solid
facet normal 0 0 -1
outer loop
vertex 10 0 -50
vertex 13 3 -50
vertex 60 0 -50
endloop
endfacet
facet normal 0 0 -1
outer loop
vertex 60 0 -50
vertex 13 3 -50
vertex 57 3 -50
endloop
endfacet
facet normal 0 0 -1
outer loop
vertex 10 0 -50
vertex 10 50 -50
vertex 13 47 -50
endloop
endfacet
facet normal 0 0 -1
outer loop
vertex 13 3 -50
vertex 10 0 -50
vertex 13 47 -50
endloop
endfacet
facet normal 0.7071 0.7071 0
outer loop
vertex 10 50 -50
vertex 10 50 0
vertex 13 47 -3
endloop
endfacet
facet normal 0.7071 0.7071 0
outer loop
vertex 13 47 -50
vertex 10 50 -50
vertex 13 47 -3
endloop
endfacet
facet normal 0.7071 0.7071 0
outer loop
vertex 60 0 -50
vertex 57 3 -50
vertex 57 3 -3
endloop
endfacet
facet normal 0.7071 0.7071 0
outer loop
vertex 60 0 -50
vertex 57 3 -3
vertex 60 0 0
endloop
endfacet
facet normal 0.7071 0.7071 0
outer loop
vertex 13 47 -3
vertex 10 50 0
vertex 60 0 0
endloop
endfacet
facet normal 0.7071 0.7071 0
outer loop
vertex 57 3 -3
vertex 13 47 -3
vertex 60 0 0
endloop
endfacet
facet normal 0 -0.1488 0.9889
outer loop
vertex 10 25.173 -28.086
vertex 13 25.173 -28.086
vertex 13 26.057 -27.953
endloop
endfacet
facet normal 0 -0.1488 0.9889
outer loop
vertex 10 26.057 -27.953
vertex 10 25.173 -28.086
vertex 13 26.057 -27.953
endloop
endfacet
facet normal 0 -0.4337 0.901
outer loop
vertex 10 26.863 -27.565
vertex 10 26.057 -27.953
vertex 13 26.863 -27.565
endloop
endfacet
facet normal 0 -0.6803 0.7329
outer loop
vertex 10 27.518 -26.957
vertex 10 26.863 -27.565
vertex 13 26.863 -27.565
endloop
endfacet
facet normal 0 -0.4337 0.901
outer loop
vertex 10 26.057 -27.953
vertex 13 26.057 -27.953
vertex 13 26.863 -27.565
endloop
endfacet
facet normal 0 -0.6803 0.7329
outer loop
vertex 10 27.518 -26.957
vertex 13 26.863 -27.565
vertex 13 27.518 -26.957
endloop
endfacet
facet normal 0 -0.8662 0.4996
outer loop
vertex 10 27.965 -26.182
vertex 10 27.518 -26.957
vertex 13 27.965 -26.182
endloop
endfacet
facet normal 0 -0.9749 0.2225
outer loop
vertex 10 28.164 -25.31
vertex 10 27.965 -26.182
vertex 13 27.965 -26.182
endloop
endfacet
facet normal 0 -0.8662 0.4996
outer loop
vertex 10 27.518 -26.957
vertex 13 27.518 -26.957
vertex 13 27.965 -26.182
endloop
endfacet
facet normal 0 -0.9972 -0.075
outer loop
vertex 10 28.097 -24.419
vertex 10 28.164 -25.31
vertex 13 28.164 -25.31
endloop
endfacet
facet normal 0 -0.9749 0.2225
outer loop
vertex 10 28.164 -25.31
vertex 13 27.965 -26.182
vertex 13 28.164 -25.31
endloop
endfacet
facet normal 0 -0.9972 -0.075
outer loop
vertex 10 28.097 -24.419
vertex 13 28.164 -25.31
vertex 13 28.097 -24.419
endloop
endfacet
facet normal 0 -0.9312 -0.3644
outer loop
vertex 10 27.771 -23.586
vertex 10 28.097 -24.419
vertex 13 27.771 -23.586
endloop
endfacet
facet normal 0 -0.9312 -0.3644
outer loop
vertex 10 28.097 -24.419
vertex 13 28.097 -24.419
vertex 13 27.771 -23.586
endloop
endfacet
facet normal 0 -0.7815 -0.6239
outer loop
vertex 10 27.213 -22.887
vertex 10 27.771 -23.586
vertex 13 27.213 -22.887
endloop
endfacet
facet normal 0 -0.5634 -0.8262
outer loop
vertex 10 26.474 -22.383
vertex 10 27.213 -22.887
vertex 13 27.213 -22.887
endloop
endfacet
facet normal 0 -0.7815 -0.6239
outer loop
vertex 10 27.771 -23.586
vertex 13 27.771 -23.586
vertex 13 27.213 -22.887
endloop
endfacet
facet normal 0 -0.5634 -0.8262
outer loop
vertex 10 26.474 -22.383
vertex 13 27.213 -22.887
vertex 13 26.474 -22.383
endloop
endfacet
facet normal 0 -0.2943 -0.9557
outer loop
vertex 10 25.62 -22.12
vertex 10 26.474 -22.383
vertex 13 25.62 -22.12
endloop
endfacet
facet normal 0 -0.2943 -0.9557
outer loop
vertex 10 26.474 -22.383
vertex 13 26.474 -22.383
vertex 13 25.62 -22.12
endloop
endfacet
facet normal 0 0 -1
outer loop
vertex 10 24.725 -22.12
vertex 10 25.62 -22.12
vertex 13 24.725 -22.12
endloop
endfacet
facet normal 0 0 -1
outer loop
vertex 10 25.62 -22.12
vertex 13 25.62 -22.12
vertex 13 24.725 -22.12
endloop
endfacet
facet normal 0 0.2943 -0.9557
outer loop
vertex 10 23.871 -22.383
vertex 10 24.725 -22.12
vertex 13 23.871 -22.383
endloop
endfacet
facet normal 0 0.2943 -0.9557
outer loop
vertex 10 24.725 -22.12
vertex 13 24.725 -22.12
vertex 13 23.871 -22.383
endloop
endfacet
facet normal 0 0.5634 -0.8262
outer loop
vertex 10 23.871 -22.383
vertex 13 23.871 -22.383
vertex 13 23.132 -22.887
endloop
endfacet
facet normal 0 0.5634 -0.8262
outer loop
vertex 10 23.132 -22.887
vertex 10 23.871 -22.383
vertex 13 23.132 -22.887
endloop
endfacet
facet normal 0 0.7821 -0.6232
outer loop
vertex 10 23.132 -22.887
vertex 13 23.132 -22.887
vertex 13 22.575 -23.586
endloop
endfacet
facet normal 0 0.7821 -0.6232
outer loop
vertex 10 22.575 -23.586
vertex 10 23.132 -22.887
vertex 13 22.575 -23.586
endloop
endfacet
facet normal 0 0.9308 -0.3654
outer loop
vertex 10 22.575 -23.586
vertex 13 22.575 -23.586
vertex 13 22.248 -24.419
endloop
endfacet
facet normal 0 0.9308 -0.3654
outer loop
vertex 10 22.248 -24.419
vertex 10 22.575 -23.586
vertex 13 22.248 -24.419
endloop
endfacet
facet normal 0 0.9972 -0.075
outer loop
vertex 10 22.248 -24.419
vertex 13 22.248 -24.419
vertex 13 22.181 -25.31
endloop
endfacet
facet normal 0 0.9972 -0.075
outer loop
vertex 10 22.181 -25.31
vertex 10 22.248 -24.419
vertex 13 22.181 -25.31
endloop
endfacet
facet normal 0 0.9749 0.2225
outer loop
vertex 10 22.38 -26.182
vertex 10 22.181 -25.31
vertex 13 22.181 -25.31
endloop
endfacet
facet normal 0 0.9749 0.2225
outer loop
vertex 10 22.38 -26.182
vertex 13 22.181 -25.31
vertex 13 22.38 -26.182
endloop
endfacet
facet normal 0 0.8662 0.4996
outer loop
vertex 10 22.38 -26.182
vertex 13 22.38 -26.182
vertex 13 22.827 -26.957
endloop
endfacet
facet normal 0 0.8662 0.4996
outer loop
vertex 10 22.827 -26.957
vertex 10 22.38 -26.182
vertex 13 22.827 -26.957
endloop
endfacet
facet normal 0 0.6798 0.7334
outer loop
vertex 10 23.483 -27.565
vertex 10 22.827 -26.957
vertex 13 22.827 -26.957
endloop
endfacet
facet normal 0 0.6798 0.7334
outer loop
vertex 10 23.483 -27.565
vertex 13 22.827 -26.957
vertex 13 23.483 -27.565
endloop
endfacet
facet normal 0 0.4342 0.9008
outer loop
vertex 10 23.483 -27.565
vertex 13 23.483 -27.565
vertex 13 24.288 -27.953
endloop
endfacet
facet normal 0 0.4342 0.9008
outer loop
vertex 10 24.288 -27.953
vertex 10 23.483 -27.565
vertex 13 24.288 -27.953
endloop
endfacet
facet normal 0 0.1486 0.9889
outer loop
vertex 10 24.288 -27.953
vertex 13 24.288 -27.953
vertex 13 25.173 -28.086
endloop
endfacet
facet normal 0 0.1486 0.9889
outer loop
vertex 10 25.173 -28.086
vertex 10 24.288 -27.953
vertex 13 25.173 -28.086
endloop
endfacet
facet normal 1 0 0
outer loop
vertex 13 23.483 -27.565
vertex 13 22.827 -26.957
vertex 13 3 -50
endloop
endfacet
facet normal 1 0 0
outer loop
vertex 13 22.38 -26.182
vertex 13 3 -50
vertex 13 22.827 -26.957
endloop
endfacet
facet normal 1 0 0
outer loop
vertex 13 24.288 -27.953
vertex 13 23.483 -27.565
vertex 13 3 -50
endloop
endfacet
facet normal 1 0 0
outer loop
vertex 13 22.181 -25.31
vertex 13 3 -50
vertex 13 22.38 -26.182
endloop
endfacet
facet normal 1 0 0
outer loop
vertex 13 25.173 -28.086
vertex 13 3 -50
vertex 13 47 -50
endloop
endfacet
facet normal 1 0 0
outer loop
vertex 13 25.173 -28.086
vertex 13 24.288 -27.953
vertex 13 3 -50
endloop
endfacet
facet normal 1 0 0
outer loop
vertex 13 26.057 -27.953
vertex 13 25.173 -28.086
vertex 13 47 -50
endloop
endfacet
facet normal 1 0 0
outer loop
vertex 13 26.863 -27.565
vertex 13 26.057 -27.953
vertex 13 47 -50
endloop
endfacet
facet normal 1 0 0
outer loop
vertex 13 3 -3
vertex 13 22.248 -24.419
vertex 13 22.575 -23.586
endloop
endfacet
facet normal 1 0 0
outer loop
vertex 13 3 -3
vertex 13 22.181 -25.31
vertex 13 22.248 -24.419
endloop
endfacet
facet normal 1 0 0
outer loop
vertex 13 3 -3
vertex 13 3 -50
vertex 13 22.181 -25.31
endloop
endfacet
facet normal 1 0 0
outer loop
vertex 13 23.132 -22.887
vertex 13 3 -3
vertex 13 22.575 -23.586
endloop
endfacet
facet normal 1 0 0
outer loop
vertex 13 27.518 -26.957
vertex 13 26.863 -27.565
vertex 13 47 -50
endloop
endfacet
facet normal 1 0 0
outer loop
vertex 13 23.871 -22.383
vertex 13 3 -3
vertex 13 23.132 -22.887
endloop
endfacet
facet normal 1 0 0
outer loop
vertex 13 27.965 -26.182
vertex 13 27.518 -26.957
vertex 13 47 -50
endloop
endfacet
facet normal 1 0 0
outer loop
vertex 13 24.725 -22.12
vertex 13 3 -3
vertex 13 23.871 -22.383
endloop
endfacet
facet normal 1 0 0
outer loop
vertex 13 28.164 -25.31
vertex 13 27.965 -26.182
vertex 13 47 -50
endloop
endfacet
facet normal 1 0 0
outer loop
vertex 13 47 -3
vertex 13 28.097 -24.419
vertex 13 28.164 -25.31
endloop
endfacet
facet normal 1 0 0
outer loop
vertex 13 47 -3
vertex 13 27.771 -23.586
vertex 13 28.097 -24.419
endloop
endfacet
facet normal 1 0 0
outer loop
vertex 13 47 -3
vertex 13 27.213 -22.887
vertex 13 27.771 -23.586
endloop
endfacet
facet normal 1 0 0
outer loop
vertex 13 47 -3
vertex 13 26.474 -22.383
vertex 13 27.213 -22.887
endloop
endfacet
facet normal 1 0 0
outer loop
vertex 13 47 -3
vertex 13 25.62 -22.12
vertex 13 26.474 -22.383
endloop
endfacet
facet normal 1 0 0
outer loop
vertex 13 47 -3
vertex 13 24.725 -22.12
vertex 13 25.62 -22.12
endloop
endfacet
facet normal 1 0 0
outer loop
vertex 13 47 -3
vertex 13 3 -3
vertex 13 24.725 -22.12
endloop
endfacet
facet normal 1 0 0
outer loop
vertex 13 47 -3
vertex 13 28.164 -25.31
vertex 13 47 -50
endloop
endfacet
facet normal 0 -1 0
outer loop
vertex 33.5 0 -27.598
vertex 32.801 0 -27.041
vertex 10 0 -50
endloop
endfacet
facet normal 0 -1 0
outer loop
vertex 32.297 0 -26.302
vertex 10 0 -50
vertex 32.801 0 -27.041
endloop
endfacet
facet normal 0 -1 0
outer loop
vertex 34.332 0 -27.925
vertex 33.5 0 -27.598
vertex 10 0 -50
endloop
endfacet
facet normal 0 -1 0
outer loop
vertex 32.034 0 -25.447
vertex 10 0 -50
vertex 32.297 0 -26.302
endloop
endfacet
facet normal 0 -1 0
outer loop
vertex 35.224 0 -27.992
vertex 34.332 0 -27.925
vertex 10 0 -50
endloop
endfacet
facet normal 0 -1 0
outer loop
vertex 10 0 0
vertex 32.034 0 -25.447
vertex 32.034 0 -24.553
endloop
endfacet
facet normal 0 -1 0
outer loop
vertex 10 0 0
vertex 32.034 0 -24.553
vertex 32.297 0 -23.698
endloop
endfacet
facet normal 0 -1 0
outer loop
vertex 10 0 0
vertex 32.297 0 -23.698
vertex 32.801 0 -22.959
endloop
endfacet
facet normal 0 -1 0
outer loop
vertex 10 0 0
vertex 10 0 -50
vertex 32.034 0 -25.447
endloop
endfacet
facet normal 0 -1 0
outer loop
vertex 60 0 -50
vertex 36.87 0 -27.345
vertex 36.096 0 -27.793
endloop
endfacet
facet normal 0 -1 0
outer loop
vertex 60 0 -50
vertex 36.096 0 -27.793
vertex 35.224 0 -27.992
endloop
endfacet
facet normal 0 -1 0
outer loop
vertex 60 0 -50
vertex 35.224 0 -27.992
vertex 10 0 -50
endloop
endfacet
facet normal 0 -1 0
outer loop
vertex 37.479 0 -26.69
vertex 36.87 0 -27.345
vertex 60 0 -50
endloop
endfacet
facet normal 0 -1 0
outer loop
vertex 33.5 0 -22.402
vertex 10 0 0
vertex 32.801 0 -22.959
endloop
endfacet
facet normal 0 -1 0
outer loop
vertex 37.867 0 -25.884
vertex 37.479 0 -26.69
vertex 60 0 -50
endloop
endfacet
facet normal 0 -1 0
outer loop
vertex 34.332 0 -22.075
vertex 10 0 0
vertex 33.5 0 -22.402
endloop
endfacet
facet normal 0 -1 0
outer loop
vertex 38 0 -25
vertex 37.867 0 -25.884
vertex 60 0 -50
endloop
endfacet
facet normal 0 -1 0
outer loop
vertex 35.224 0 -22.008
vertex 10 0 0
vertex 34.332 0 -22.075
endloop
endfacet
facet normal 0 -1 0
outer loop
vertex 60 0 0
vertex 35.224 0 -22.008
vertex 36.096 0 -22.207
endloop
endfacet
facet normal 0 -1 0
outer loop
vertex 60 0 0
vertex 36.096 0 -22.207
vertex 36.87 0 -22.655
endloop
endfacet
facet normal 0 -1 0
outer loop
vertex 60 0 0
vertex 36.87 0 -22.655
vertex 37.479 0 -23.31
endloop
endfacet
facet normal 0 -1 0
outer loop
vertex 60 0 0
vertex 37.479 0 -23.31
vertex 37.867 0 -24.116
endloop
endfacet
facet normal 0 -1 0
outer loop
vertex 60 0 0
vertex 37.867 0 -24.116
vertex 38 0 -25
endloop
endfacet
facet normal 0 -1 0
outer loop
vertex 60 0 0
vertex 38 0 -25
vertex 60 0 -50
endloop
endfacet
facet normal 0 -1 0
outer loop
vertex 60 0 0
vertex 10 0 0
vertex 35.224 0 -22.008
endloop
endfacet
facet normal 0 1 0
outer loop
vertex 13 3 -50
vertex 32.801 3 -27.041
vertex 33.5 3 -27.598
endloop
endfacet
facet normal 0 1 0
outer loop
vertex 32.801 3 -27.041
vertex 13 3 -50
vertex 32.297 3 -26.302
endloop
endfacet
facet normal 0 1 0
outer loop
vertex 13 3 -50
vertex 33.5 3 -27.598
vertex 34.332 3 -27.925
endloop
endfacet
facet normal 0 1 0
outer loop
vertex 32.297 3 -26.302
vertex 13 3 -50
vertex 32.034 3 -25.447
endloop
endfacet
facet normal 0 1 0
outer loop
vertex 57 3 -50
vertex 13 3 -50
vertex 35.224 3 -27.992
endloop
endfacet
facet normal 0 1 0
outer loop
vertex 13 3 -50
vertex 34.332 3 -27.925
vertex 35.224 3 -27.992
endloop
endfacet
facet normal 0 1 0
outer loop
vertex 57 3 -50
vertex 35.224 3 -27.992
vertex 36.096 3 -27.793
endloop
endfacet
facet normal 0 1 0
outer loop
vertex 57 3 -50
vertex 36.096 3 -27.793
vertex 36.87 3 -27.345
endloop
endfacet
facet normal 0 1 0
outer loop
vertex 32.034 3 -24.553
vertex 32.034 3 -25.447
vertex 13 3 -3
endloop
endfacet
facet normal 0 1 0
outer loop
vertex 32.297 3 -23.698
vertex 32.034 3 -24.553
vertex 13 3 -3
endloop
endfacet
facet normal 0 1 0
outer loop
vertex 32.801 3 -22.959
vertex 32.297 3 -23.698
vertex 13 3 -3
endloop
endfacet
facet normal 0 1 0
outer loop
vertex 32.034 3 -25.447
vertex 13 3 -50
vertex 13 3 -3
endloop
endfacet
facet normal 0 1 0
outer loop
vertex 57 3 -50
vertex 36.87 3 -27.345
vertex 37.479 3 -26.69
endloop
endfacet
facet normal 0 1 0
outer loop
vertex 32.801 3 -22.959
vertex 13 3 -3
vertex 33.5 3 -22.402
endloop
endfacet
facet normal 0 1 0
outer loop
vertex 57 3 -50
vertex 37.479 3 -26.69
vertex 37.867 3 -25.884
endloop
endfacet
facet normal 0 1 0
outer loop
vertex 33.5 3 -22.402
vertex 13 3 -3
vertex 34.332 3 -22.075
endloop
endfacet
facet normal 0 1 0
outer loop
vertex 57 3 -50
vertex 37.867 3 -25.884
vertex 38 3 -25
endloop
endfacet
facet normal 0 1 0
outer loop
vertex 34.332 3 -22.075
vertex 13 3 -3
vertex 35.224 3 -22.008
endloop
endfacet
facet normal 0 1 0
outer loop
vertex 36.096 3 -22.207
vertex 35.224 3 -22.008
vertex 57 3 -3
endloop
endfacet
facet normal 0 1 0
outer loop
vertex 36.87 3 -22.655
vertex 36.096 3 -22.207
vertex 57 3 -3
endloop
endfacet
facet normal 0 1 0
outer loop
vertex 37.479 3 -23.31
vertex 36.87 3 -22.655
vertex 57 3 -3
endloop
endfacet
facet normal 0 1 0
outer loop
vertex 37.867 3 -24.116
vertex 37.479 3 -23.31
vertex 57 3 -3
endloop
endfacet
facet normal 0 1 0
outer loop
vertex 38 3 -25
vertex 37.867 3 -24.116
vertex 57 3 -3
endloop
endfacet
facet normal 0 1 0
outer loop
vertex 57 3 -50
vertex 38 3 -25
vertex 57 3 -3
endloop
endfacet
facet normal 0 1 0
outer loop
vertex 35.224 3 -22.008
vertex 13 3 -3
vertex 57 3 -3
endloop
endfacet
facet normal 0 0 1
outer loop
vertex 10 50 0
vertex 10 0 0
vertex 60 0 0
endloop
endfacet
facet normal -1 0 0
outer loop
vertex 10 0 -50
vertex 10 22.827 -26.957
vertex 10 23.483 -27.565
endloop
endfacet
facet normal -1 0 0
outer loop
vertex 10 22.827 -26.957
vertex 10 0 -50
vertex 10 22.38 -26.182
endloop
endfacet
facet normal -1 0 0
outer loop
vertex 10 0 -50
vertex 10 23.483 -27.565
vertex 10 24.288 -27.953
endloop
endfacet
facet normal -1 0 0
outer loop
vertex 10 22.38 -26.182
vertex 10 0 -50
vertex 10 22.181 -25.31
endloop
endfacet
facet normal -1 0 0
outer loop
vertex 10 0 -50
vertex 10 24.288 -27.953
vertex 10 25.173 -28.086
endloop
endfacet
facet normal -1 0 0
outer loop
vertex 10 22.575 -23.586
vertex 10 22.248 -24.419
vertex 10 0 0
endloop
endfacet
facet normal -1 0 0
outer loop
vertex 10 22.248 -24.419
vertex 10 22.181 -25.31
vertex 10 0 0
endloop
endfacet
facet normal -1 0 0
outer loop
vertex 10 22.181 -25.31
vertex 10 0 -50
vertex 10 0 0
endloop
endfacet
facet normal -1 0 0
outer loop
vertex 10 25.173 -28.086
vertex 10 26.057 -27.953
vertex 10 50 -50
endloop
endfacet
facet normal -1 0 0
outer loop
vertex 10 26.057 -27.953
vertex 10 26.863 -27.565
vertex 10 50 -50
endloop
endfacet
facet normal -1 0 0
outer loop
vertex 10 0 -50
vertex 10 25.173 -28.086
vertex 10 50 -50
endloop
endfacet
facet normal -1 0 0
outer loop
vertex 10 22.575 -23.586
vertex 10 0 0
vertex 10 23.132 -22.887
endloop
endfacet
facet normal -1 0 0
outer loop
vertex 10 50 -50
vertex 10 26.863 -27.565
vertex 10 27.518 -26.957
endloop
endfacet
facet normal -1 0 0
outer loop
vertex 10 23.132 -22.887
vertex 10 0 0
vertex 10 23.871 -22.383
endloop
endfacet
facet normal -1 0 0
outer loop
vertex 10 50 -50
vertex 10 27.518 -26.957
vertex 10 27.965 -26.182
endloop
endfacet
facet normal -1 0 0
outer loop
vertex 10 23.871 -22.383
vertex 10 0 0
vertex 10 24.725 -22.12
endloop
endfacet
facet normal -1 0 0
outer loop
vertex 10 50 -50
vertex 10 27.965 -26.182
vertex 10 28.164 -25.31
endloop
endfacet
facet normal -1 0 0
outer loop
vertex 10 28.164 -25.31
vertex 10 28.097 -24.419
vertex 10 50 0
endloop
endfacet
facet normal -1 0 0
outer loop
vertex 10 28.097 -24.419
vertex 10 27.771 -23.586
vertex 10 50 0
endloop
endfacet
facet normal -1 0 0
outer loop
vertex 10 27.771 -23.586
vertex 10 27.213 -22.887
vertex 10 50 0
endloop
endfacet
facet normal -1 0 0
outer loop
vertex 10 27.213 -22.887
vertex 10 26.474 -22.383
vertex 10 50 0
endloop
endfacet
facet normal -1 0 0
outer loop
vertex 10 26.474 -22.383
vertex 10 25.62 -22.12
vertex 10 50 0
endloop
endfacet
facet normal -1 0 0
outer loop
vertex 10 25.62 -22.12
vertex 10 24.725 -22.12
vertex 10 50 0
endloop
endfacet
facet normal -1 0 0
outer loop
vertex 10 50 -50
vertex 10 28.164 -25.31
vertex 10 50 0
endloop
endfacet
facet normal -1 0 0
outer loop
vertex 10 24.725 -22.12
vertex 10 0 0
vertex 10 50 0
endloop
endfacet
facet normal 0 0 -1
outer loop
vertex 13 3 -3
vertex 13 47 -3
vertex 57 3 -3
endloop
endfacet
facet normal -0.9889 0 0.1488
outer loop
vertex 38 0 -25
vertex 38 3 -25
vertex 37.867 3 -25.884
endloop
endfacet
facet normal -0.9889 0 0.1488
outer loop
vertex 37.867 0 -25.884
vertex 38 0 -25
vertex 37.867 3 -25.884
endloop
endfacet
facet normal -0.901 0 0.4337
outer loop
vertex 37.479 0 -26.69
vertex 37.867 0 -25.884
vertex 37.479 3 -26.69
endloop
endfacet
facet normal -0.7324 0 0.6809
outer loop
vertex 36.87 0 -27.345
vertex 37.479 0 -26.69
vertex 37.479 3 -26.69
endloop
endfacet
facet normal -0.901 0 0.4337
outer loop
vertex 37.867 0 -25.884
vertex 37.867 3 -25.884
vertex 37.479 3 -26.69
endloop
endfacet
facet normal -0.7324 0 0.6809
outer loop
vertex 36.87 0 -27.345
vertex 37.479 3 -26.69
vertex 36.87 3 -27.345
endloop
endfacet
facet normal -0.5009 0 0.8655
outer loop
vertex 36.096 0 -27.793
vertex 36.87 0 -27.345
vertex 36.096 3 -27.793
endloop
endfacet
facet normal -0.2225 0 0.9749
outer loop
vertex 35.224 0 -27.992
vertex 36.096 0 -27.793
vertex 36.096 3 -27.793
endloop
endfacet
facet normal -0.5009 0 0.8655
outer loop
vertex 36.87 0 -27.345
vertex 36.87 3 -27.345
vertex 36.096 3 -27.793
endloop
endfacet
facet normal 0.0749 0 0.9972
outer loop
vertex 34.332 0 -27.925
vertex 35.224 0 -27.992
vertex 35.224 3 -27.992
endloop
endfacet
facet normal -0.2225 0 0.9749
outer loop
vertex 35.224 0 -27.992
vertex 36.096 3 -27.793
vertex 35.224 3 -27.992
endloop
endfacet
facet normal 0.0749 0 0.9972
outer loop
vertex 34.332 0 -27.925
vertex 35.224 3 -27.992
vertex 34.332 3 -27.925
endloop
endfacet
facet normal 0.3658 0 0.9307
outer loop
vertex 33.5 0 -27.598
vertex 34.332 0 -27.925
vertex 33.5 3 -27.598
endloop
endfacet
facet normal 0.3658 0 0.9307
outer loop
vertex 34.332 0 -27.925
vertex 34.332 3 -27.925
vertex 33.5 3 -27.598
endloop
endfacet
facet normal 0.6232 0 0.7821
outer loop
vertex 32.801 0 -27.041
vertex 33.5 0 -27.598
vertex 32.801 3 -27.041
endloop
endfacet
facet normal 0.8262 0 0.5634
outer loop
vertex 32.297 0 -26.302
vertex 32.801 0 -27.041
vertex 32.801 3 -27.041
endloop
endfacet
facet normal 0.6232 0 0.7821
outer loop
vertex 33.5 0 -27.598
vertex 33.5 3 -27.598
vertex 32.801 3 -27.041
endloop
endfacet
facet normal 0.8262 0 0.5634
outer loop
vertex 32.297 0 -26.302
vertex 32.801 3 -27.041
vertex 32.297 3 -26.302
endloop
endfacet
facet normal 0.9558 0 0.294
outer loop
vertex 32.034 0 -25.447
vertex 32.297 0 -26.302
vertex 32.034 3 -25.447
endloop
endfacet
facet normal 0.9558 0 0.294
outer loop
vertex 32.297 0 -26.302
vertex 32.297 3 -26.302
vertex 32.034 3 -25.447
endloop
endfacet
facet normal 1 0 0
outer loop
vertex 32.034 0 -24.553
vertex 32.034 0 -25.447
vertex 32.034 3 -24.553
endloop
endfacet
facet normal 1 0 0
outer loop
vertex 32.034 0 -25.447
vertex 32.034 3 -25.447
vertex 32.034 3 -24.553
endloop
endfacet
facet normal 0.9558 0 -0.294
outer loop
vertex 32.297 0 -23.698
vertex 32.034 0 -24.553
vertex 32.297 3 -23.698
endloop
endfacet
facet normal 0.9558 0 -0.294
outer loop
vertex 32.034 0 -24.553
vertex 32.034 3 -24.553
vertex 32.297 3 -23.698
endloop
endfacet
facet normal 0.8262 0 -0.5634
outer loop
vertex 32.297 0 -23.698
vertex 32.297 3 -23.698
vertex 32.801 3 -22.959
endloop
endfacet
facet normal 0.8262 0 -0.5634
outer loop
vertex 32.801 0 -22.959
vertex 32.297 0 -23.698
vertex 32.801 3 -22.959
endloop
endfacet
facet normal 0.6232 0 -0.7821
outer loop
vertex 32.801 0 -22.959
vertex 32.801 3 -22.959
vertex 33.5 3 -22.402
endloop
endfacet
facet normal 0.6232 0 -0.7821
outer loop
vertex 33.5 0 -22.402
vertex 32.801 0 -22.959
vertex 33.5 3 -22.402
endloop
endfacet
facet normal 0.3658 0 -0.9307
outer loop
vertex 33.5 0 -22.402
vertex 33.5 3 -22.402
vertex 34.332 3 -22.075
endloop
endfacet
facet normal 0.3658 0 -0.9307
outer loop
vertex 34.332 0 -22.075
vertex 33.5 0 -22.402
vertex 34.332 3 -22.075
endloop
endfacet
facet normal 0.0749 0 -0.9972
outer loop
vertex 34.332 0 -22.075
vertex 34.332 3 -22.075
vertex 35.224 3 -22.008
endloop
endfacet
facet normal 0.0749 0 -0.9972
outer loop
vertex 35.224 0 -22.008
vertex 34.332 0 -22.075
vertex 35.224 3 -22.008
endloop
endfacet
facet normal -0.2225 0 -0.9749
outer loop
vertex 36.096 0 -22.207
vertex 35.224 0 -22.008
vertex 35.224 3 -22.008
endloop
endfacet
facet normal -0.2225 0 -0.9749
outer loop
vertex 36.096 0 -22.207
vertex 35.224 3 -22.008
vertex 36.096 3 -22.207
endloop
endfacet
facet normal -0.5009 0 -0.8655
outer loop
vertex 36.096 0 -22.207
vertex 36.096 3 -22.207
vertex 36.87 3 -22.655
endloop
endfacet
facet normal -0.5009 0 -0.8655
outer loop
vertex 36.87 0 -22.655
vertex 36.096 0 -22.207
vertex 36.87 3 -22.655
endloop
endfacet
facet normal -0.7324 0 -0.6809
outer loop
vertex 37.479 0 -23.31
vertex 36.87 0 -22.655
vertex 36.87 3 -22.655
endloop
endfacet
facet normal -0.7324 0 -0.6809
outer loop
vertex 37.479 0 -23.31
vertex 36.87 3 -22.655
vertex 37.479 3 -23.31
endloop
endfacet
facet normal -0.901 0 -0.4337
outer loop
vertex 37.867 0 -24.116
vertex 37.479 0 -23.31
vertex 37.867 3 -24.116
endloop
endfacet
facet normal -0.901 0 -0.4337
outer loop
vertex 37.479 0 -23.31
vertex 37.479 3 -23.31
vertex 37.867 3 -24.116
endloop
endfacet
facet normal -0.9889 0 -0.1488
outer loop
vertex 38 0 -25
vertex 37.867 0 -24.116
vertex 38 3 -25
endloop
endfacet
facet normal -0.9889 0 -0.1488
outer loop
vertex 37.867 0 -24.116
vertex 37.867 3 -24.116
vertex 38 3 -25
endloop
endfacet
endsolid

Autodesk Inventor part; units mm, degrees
ref_plane "YZ Plane" through (0, 0, 0) normal (1, 0, 0) x (0, 1, 0)
ref_plane "XZ Plane" through (0, 0, 0) normal (0, 1, 0) x (-1, 0, 0)
ref_plane "XY Plane" through (0, 0, 0) normal (0, 0, 1) x (1, 0, 0)
sketch "Sketch1" plane through (0, 0, 0) normal (0, 0, 1) x (1, 0, 0)
  line L0 (10, 0) -> (10, 1000) projected
  line L1 (0, 0) -> (1181.712, 0) projected
  line L2 (10, 0) -> (10, 50)
  line L3 (10, 50) -> (60, 0)
  line L4 (10, 50) -> (80.7107, 50) construction
  line L5 (60, 0) -> (10, 0)
  dimension "d0" = 45
  dimension "d1" = 50
extrude "Extrusion1" add sketch "Sketch1" against normal blind 50
shell "Shell1" thickness 3 removed faces 2 at (43.3333, 16.6667, -16.6667) at (26.6667, 16.6667, -50)
sketch "Sketch2" plane through (13, 3, -3) normal (0, 1, 0) x (1, 0, 0)
  circle A0 centre (22, 22) radius 3
  line L0 (47, -3) -> (47, 47) projected
  line L1 (-3, 47) -> (47, -3) construction
  line L2 (-3, -3) -> (47, 47) construction
  point P0 (-13, -3)
  point P1 (22, 22)
  dimension "d5" = 6
sketch "Sketch3" plane through (13, 3, -3) normal (1, 0, 0) x (0, 0, -1)
  line L0 (-3, -3) -> (-3, 47) projected
  line L1 (-3, 47) -> (47.1723, -3) construction
  line L2 (47.1723, -3) -> (47.1723, 47.3451)
  line L3 (47.1723, 47.3451) -> (-3, -3) construction
  circle A0 centre (22.0861, 22.1726) radius 3
  point P0 (22.0861, 22.1726)
  dimension "d6" = 6
extrude "Extrusion2" cut sketch "Sketch2" against normal through all
extrude "Extrusion3" cut sketch "Sketch3" against normal through all
properties part number "Perfil de unión protección"
